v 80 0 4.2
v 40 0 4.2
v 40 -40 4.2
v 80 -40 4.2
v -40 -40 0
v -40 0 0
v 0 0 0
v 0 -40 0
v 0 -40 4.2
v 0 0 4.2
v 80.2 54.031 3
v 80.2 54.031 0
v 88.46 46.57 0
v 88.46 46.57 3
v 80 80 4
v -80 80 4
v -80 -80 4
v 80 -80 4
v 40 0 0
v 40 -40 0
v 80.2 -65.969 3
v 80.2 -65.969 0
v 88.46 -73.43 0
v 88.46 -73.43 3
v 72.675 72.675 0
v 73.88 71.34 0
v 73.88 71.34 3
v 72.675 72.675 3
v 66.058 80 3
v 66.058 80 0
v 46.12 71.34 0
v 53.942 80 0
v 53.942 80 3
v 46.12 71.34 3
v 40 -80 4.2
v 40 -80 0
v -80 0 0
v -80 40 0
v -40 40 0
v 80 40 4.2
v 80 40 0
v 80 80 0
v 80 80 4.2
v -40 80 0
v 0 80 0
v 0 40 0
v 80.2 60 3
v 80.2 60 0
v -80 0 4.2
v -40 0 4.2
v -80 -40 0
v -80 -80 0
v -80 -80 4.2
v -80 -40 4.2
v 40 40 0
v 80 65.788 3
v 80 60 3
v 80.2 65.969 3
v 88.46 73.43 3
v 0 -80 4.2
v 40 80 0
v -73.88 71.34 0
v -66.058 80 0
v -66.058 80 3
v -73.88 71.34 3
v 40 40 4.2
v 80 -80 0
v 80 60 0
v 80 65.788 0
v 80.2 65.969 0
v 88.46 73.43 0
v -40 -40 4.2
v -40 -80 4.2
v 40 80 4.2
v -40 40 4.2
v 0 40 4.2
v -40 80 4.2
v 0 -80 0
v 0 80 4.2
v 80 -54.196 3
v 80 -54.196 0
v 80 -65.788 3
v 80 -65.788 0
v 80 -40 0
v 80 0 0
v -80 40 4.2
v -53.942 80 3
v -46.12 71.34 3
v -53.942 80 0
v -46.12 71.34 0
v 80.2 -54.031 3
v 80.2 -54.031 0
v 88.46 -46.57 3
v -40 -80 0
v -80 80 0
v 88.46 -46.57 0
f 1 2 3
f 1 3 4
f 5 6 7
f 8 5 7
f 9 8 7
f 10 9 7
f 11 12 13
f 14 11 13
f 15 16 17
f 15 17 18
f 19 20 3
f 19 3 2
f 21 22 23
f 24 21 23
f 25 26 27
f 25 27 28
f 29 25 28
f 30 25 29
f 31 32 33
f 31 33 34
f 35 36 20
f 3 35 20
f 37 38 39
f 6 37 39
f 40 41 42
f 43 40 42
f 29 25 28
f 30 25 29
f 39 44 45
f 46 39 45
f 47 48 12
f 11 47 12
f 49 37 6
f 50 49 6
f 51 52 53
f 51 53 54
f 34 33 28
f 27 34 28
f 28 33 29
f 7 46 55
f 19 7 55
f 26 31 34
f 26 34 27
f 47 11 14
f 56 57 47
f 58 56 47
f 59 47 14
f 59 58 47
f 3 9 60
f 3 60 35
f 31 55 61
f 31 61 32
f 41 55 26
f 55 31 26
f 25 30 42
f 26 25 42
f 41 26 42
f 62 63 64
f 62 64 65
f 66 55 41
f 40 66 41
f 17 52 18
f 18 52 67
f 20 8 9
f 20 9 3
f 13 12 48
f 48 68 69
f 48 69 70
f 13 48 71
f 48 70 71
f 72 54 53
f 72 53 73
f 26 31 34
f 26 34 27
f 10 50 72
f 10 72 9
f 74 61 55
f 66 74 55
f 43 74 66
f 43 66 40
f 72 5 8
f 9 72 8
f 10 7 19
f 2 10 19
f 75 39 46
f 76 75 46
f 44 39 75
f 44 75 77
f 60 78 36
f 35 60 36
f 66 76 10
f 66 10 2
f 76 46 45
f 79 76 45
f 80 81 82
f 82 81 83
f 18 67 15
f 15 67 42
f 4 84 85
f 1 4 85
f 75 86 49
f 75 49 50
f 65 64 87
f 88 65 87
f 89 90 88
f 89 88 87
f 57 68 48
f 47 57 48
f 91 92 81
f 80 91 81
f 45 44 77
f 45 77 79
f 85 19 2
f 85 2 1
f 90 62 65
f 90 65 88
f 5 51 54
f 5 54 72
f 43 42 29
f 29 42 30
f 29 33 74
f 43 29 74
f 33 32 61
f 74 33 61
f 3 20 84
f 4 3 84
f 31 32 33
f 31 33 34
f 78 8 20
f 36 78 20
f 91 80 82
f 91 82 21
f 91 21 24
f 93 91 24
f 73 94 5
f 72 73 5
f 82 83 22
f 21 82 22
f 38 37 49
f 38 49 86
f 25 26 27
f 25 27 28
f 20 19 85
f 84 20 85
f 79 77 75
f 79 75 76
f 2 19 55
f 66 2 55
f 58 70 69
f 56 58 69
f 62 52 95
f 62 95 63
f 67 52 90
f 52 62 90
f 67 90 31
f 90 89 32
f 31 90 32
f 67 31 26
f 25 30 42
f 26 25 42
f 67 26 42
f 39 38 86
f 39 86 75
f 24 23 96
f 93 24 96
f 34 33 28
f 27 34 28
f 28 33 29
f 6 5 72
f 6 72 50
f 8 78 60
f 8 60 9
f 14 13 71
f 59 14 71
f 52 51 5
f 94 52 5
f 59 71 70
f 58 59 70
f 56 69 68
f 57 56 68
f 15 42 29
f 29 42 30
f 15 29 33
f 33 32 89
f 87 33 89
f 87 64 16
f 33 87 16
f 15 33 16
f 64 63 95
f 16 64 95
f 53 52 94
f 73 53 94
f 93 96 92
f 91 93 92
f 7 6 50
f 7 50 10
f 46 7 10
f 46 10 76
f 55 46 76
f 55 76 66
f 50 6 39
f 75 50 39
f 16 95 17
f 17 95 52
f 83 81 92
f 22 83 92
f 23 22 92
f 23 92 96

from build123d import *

# Parameters (mm, degrees)
F0_W     = 40
F0_H     = 40
F1_DEPTH = 4
F2_DEPTH = 4.2
F3_DEPTH = 3
F4_DEPTH = 3


with BuildPart() as f1:
    # F0 (on Top) → F1 (new body)
    with BuildSketch(Plane.XY):
        Polygon((-80, 80), (-80, 40), (-40, 40), (-40, 80), (-53.9420571923, 80), (-46.1195930839, 71.3396444917), (-60, 71.3396444917), (-73.8804069161, 71.3396444917), (-66.0579428077, 80), align=None)
        Polygon((-60, 80), (-66.0579428077, 80), (-73.8804069161, 71.3396444917), (-60, 71.3396444917), align=None)
        Polygon((-46.1195930839, 71.3396444917), (-53.9420571923, 80), (-60, 80), (-60, 71.3396444917), align=None)
        with Locations((-20, 60)):
            Rectangle(F0_W, F0_H)
        with Locations((20, 60)):
            Rectangle(F0_W, F0_H)
        Polygon((40, 80), (40, 40), (71.3396444917, 71.3396444917), (60, 71.3396444917), (46.1195930839, 71.3396444917), (53.9420571923, 80), align=None)
        Polygon((71.3396444917, 71.3396444917), (40, 40), (80, 40), (80, 53.9420571923), (80, 54.19581756), (80, 60), (80, 65.7884331082), (80, 66.0579428077), (80, 80), (72.6746045513, 72.6746045513), (73.8804069161, 71.3396444917), align=None)
        Polygon((72.6746045513, 72.6746045513), (71.3396444917, 71.3396444917), (73.8804069161, 71.3396444917), align=None)
        Polygon((60, 71.3396444917), (71.3396444917, 71.3396444917), (72.6746045513, 72.6746045513), (66.0579428077, 80), (60, 80), align=None)
        Polygon((66.0579428077, 80), (72.6746045513, 72.6746045513), (80, 80), align=None)
        Polygon((60, 80), (53.9420571923, 80), (46.1195930839, 71.3396444917), (60, 71.3396444917), align=None)
        with Locations((20, 20)):
            Rectangle(F0_W, F0_H)
        with Locations((-20, 20)):
            Rectangle(F0_W, F0_H)
        with Locations((-60, 20)):
            Rectangle(F0_W, F0_H)
        with Locations((-60, -20)):
            Rectangle(F0_W, F0_H)
        with Locations((-20, -20)):
            Rectangle(F0_W, F0_H)
        with Locations((20, -20)):
            Rectangle(F0_W, F0_H)
        with Locations((60, -20)):
            Rectangle(F0_W, F0_H)
        Polygon((40, -40), (40, -80), (80, -80), (80, -66.0579428077), (80, -65.7884331082), (80, -60), (80, -54.19581756), (80, -53.9420571923), (80, -40), align=None)
        with Locations((20, -60)):
            Rectangle(F0_W, F0_H)
        with Locations((-20, -60)):
            Rectangle(F0_W, F0_H)
        with Locations((-60, -60)):
            Rectangle(F0_W, F0_H)
        with Locations((60, 20)):
            Rectangle(F0_W, F0_H)
    extrude(amount=F1_DEPTH)


with BuildPart() as f2:
    # F0 (on Top) → F2 (new body)
    with BuildSketch(Plane.XY):
        with Locations((-60, -60)):
            Rectangle(F0_W, F0_H)
    extrude(amount=F2_DEPTH)


with BuildPart() as f2b:
    # F0 (on Top) → F2, piece 2 (new body)
    with BuildSketch(Plane.XY):
        with Locations((-20, -20)):
            Rectangle(F0_W, F0_H)
    extrude(amount=F2_DEPTH)


with BuildPart() as f2c:
    # F0 (on Top) → F2, piece 3 (new body)
    with BuildSketch(Plane.XY):
        with Locations((-60, 20)):
            Rectangle(F0_W, F0_H)
    extrude(amount=F2_DEPTH)


with BuildPart() as f2d:
    # F0 (on Top) → F2, piece 4 (new body)
    with BuildSketch(Plane.XY):
        with Locations((-20, 60)):
            Rectangle(F0_W, F0_H)
    extrude(amount=F2_DEPTH)


with BuildPart() as f2e:
    # F0 (on Top) → F2, piece 5 (new body)
    with BuildSketch(Plane.XY):
        with Locations((20, 20)):
            Rectangle(F0_W, F0_H)
    extrude(amount=F2_DEPTH)


with BuildPart() as f2f:
    # F0 (on Top) → F2, piece 6 (new body)
    with BuildSketch(Plane.XY):
        with Locations((60, -20)):
            Rectangle(F0_W, F0_H)
    extrude(amount=F2_DEPTH)


with BuildPart() as f2g:
    # F0 (on Top) → F2, piece 7 (new body)
    with BuildSketch(Plane.XY):
        with Locations((20, -60)):
            Rectangle(F0_W, F0_H)
    extrude(amount=F2_DEPTH)


with BuildPart() as f2h:
    # F0 (on Top) → F2, piece 8 (new body)
    with BuildSketch(Plane.XY):
        Polygon((40, 80), (40, 40), (71.3396444917, 71.3396444917), (60, 71.3396444917), (46.1195930839, 71.3396444917), (53.9420571923, 80), align=None)
        Polygon((71.3396444917, 71.3396444917), (40, 40), (80, 40), (80, 53.9420571923), (80, 54.19581756), (80, 60), (80, 65.7884331082), (80, 66.0579428077), (80, 80), (72.6746045513, 72.6746045513), (73.8804069161, 71.3396444917), align=None)
        Polygon((60, 71.3396444917), (71.3396444917, 71.3396444917), (72.6746045513, 72.6746045513), (66.0579428077, 80), (60, 80), align=None)
        Polygon((60, 80), (53.9420571923, 80), (46.1195930839, 71.3396444917), (60, 71.3396444917), align=None)
        Polygon((66.0579428077, 80), (72.6746045513, 72.6746045513), (80, 80), align=None)
        Polygon((72.6746045513, 72.6746045513), (71.3396444917, 71.3396444917), (73.8804069161, 71.3396444917), align=None)
    extrude(amount=F2_DEPTH)


with BuildPart() as f3_tool:
    # F0 (on Top) → F3 (new body)
    with BuildSketch(Plane.XY):
        Polygon((60, 80), (53.9420571923, 80), (46.1195930839, 71.3396444917), (60, 71.3396444917), align=None)
        Polygon((60, 71.3396444917), (71.3396444917, 71.3396444917), (72.6746045513, 72.6746045513), (66.0579428077, 80), (60, 80), align=None)
        Polygon((72.6746045513, 72.6746045513), (71.3396444917, 71.3396444917), (73.8804069161, 71.3396444917), align=None)
        Polygon((-60, 80), (-66.0579428077, 80), (-73.8804069161, 71.3396444917), (-60, 71.3396444917), align=None)
        Polygon((-46.1195930839, 71.3396444917), (-53.9420571923, 80), (-60, 80), (-60, 71.3396444917), align=None)
    extrude(amount=F3_DEPTH)


with BuildPart() as f1_1:
    add(f1.part)

    # F3: cut by f3_tool
    add(f3_tool.part, mode=Mode.SUBTRACT)


with BuildPart() as f2h_1:
    add(f2h.part)

    # F3: cut by f3_tool
    add(f3_tool.part, mode=Mode.SUBTRACT)


with BuildPart() as f4:
    # F0 (on Top) → F4 (new body)
    with BuildSketch(Plane.XY):
        Polygon((80, 65.7884331082), (80, 60), (80.2000014764, 60), (80.2000014764, 65.9690843954), align=None)
        Polygon((80.2000014764, 60), (80.2000014764, 54.0309156046), (88.460354032, 46.5697540706), (88.460354032, 60), align=None)
        Polygon((80.2000014764, 65.9690843954), (80.2000014764, 60), (88.460354032, 60), (88.460354032, 73.4302459294), align=None)
    extrude(amount=F4_DEPTH)


with BuildPart() as f4b:
    # F0 (on Top) → F4, piece 2 (new body)
    with BuildSketch(Plane.XY):
        Polygon((80, -54.19581756), (80, -60), (88.460354032, -60), (88.460354032, -46.5697540706), (80.2000014764, -54.0309156046), align=None)
        Polygon((80, -60), (80, -65.7884331082), (80.2000014764, -65.9690843954), (88.460354032, -73.4302459294), (88.460354032, -60), align=None)
    extrude(amount=F4_DEPTH)


solid = Compound([f2.part, f2b.part, f2c.part, f2d.part, f2e.part, f2f.part, f2g.part, f1_1.part, f2h_1.part, f4.part, f4b.part])
